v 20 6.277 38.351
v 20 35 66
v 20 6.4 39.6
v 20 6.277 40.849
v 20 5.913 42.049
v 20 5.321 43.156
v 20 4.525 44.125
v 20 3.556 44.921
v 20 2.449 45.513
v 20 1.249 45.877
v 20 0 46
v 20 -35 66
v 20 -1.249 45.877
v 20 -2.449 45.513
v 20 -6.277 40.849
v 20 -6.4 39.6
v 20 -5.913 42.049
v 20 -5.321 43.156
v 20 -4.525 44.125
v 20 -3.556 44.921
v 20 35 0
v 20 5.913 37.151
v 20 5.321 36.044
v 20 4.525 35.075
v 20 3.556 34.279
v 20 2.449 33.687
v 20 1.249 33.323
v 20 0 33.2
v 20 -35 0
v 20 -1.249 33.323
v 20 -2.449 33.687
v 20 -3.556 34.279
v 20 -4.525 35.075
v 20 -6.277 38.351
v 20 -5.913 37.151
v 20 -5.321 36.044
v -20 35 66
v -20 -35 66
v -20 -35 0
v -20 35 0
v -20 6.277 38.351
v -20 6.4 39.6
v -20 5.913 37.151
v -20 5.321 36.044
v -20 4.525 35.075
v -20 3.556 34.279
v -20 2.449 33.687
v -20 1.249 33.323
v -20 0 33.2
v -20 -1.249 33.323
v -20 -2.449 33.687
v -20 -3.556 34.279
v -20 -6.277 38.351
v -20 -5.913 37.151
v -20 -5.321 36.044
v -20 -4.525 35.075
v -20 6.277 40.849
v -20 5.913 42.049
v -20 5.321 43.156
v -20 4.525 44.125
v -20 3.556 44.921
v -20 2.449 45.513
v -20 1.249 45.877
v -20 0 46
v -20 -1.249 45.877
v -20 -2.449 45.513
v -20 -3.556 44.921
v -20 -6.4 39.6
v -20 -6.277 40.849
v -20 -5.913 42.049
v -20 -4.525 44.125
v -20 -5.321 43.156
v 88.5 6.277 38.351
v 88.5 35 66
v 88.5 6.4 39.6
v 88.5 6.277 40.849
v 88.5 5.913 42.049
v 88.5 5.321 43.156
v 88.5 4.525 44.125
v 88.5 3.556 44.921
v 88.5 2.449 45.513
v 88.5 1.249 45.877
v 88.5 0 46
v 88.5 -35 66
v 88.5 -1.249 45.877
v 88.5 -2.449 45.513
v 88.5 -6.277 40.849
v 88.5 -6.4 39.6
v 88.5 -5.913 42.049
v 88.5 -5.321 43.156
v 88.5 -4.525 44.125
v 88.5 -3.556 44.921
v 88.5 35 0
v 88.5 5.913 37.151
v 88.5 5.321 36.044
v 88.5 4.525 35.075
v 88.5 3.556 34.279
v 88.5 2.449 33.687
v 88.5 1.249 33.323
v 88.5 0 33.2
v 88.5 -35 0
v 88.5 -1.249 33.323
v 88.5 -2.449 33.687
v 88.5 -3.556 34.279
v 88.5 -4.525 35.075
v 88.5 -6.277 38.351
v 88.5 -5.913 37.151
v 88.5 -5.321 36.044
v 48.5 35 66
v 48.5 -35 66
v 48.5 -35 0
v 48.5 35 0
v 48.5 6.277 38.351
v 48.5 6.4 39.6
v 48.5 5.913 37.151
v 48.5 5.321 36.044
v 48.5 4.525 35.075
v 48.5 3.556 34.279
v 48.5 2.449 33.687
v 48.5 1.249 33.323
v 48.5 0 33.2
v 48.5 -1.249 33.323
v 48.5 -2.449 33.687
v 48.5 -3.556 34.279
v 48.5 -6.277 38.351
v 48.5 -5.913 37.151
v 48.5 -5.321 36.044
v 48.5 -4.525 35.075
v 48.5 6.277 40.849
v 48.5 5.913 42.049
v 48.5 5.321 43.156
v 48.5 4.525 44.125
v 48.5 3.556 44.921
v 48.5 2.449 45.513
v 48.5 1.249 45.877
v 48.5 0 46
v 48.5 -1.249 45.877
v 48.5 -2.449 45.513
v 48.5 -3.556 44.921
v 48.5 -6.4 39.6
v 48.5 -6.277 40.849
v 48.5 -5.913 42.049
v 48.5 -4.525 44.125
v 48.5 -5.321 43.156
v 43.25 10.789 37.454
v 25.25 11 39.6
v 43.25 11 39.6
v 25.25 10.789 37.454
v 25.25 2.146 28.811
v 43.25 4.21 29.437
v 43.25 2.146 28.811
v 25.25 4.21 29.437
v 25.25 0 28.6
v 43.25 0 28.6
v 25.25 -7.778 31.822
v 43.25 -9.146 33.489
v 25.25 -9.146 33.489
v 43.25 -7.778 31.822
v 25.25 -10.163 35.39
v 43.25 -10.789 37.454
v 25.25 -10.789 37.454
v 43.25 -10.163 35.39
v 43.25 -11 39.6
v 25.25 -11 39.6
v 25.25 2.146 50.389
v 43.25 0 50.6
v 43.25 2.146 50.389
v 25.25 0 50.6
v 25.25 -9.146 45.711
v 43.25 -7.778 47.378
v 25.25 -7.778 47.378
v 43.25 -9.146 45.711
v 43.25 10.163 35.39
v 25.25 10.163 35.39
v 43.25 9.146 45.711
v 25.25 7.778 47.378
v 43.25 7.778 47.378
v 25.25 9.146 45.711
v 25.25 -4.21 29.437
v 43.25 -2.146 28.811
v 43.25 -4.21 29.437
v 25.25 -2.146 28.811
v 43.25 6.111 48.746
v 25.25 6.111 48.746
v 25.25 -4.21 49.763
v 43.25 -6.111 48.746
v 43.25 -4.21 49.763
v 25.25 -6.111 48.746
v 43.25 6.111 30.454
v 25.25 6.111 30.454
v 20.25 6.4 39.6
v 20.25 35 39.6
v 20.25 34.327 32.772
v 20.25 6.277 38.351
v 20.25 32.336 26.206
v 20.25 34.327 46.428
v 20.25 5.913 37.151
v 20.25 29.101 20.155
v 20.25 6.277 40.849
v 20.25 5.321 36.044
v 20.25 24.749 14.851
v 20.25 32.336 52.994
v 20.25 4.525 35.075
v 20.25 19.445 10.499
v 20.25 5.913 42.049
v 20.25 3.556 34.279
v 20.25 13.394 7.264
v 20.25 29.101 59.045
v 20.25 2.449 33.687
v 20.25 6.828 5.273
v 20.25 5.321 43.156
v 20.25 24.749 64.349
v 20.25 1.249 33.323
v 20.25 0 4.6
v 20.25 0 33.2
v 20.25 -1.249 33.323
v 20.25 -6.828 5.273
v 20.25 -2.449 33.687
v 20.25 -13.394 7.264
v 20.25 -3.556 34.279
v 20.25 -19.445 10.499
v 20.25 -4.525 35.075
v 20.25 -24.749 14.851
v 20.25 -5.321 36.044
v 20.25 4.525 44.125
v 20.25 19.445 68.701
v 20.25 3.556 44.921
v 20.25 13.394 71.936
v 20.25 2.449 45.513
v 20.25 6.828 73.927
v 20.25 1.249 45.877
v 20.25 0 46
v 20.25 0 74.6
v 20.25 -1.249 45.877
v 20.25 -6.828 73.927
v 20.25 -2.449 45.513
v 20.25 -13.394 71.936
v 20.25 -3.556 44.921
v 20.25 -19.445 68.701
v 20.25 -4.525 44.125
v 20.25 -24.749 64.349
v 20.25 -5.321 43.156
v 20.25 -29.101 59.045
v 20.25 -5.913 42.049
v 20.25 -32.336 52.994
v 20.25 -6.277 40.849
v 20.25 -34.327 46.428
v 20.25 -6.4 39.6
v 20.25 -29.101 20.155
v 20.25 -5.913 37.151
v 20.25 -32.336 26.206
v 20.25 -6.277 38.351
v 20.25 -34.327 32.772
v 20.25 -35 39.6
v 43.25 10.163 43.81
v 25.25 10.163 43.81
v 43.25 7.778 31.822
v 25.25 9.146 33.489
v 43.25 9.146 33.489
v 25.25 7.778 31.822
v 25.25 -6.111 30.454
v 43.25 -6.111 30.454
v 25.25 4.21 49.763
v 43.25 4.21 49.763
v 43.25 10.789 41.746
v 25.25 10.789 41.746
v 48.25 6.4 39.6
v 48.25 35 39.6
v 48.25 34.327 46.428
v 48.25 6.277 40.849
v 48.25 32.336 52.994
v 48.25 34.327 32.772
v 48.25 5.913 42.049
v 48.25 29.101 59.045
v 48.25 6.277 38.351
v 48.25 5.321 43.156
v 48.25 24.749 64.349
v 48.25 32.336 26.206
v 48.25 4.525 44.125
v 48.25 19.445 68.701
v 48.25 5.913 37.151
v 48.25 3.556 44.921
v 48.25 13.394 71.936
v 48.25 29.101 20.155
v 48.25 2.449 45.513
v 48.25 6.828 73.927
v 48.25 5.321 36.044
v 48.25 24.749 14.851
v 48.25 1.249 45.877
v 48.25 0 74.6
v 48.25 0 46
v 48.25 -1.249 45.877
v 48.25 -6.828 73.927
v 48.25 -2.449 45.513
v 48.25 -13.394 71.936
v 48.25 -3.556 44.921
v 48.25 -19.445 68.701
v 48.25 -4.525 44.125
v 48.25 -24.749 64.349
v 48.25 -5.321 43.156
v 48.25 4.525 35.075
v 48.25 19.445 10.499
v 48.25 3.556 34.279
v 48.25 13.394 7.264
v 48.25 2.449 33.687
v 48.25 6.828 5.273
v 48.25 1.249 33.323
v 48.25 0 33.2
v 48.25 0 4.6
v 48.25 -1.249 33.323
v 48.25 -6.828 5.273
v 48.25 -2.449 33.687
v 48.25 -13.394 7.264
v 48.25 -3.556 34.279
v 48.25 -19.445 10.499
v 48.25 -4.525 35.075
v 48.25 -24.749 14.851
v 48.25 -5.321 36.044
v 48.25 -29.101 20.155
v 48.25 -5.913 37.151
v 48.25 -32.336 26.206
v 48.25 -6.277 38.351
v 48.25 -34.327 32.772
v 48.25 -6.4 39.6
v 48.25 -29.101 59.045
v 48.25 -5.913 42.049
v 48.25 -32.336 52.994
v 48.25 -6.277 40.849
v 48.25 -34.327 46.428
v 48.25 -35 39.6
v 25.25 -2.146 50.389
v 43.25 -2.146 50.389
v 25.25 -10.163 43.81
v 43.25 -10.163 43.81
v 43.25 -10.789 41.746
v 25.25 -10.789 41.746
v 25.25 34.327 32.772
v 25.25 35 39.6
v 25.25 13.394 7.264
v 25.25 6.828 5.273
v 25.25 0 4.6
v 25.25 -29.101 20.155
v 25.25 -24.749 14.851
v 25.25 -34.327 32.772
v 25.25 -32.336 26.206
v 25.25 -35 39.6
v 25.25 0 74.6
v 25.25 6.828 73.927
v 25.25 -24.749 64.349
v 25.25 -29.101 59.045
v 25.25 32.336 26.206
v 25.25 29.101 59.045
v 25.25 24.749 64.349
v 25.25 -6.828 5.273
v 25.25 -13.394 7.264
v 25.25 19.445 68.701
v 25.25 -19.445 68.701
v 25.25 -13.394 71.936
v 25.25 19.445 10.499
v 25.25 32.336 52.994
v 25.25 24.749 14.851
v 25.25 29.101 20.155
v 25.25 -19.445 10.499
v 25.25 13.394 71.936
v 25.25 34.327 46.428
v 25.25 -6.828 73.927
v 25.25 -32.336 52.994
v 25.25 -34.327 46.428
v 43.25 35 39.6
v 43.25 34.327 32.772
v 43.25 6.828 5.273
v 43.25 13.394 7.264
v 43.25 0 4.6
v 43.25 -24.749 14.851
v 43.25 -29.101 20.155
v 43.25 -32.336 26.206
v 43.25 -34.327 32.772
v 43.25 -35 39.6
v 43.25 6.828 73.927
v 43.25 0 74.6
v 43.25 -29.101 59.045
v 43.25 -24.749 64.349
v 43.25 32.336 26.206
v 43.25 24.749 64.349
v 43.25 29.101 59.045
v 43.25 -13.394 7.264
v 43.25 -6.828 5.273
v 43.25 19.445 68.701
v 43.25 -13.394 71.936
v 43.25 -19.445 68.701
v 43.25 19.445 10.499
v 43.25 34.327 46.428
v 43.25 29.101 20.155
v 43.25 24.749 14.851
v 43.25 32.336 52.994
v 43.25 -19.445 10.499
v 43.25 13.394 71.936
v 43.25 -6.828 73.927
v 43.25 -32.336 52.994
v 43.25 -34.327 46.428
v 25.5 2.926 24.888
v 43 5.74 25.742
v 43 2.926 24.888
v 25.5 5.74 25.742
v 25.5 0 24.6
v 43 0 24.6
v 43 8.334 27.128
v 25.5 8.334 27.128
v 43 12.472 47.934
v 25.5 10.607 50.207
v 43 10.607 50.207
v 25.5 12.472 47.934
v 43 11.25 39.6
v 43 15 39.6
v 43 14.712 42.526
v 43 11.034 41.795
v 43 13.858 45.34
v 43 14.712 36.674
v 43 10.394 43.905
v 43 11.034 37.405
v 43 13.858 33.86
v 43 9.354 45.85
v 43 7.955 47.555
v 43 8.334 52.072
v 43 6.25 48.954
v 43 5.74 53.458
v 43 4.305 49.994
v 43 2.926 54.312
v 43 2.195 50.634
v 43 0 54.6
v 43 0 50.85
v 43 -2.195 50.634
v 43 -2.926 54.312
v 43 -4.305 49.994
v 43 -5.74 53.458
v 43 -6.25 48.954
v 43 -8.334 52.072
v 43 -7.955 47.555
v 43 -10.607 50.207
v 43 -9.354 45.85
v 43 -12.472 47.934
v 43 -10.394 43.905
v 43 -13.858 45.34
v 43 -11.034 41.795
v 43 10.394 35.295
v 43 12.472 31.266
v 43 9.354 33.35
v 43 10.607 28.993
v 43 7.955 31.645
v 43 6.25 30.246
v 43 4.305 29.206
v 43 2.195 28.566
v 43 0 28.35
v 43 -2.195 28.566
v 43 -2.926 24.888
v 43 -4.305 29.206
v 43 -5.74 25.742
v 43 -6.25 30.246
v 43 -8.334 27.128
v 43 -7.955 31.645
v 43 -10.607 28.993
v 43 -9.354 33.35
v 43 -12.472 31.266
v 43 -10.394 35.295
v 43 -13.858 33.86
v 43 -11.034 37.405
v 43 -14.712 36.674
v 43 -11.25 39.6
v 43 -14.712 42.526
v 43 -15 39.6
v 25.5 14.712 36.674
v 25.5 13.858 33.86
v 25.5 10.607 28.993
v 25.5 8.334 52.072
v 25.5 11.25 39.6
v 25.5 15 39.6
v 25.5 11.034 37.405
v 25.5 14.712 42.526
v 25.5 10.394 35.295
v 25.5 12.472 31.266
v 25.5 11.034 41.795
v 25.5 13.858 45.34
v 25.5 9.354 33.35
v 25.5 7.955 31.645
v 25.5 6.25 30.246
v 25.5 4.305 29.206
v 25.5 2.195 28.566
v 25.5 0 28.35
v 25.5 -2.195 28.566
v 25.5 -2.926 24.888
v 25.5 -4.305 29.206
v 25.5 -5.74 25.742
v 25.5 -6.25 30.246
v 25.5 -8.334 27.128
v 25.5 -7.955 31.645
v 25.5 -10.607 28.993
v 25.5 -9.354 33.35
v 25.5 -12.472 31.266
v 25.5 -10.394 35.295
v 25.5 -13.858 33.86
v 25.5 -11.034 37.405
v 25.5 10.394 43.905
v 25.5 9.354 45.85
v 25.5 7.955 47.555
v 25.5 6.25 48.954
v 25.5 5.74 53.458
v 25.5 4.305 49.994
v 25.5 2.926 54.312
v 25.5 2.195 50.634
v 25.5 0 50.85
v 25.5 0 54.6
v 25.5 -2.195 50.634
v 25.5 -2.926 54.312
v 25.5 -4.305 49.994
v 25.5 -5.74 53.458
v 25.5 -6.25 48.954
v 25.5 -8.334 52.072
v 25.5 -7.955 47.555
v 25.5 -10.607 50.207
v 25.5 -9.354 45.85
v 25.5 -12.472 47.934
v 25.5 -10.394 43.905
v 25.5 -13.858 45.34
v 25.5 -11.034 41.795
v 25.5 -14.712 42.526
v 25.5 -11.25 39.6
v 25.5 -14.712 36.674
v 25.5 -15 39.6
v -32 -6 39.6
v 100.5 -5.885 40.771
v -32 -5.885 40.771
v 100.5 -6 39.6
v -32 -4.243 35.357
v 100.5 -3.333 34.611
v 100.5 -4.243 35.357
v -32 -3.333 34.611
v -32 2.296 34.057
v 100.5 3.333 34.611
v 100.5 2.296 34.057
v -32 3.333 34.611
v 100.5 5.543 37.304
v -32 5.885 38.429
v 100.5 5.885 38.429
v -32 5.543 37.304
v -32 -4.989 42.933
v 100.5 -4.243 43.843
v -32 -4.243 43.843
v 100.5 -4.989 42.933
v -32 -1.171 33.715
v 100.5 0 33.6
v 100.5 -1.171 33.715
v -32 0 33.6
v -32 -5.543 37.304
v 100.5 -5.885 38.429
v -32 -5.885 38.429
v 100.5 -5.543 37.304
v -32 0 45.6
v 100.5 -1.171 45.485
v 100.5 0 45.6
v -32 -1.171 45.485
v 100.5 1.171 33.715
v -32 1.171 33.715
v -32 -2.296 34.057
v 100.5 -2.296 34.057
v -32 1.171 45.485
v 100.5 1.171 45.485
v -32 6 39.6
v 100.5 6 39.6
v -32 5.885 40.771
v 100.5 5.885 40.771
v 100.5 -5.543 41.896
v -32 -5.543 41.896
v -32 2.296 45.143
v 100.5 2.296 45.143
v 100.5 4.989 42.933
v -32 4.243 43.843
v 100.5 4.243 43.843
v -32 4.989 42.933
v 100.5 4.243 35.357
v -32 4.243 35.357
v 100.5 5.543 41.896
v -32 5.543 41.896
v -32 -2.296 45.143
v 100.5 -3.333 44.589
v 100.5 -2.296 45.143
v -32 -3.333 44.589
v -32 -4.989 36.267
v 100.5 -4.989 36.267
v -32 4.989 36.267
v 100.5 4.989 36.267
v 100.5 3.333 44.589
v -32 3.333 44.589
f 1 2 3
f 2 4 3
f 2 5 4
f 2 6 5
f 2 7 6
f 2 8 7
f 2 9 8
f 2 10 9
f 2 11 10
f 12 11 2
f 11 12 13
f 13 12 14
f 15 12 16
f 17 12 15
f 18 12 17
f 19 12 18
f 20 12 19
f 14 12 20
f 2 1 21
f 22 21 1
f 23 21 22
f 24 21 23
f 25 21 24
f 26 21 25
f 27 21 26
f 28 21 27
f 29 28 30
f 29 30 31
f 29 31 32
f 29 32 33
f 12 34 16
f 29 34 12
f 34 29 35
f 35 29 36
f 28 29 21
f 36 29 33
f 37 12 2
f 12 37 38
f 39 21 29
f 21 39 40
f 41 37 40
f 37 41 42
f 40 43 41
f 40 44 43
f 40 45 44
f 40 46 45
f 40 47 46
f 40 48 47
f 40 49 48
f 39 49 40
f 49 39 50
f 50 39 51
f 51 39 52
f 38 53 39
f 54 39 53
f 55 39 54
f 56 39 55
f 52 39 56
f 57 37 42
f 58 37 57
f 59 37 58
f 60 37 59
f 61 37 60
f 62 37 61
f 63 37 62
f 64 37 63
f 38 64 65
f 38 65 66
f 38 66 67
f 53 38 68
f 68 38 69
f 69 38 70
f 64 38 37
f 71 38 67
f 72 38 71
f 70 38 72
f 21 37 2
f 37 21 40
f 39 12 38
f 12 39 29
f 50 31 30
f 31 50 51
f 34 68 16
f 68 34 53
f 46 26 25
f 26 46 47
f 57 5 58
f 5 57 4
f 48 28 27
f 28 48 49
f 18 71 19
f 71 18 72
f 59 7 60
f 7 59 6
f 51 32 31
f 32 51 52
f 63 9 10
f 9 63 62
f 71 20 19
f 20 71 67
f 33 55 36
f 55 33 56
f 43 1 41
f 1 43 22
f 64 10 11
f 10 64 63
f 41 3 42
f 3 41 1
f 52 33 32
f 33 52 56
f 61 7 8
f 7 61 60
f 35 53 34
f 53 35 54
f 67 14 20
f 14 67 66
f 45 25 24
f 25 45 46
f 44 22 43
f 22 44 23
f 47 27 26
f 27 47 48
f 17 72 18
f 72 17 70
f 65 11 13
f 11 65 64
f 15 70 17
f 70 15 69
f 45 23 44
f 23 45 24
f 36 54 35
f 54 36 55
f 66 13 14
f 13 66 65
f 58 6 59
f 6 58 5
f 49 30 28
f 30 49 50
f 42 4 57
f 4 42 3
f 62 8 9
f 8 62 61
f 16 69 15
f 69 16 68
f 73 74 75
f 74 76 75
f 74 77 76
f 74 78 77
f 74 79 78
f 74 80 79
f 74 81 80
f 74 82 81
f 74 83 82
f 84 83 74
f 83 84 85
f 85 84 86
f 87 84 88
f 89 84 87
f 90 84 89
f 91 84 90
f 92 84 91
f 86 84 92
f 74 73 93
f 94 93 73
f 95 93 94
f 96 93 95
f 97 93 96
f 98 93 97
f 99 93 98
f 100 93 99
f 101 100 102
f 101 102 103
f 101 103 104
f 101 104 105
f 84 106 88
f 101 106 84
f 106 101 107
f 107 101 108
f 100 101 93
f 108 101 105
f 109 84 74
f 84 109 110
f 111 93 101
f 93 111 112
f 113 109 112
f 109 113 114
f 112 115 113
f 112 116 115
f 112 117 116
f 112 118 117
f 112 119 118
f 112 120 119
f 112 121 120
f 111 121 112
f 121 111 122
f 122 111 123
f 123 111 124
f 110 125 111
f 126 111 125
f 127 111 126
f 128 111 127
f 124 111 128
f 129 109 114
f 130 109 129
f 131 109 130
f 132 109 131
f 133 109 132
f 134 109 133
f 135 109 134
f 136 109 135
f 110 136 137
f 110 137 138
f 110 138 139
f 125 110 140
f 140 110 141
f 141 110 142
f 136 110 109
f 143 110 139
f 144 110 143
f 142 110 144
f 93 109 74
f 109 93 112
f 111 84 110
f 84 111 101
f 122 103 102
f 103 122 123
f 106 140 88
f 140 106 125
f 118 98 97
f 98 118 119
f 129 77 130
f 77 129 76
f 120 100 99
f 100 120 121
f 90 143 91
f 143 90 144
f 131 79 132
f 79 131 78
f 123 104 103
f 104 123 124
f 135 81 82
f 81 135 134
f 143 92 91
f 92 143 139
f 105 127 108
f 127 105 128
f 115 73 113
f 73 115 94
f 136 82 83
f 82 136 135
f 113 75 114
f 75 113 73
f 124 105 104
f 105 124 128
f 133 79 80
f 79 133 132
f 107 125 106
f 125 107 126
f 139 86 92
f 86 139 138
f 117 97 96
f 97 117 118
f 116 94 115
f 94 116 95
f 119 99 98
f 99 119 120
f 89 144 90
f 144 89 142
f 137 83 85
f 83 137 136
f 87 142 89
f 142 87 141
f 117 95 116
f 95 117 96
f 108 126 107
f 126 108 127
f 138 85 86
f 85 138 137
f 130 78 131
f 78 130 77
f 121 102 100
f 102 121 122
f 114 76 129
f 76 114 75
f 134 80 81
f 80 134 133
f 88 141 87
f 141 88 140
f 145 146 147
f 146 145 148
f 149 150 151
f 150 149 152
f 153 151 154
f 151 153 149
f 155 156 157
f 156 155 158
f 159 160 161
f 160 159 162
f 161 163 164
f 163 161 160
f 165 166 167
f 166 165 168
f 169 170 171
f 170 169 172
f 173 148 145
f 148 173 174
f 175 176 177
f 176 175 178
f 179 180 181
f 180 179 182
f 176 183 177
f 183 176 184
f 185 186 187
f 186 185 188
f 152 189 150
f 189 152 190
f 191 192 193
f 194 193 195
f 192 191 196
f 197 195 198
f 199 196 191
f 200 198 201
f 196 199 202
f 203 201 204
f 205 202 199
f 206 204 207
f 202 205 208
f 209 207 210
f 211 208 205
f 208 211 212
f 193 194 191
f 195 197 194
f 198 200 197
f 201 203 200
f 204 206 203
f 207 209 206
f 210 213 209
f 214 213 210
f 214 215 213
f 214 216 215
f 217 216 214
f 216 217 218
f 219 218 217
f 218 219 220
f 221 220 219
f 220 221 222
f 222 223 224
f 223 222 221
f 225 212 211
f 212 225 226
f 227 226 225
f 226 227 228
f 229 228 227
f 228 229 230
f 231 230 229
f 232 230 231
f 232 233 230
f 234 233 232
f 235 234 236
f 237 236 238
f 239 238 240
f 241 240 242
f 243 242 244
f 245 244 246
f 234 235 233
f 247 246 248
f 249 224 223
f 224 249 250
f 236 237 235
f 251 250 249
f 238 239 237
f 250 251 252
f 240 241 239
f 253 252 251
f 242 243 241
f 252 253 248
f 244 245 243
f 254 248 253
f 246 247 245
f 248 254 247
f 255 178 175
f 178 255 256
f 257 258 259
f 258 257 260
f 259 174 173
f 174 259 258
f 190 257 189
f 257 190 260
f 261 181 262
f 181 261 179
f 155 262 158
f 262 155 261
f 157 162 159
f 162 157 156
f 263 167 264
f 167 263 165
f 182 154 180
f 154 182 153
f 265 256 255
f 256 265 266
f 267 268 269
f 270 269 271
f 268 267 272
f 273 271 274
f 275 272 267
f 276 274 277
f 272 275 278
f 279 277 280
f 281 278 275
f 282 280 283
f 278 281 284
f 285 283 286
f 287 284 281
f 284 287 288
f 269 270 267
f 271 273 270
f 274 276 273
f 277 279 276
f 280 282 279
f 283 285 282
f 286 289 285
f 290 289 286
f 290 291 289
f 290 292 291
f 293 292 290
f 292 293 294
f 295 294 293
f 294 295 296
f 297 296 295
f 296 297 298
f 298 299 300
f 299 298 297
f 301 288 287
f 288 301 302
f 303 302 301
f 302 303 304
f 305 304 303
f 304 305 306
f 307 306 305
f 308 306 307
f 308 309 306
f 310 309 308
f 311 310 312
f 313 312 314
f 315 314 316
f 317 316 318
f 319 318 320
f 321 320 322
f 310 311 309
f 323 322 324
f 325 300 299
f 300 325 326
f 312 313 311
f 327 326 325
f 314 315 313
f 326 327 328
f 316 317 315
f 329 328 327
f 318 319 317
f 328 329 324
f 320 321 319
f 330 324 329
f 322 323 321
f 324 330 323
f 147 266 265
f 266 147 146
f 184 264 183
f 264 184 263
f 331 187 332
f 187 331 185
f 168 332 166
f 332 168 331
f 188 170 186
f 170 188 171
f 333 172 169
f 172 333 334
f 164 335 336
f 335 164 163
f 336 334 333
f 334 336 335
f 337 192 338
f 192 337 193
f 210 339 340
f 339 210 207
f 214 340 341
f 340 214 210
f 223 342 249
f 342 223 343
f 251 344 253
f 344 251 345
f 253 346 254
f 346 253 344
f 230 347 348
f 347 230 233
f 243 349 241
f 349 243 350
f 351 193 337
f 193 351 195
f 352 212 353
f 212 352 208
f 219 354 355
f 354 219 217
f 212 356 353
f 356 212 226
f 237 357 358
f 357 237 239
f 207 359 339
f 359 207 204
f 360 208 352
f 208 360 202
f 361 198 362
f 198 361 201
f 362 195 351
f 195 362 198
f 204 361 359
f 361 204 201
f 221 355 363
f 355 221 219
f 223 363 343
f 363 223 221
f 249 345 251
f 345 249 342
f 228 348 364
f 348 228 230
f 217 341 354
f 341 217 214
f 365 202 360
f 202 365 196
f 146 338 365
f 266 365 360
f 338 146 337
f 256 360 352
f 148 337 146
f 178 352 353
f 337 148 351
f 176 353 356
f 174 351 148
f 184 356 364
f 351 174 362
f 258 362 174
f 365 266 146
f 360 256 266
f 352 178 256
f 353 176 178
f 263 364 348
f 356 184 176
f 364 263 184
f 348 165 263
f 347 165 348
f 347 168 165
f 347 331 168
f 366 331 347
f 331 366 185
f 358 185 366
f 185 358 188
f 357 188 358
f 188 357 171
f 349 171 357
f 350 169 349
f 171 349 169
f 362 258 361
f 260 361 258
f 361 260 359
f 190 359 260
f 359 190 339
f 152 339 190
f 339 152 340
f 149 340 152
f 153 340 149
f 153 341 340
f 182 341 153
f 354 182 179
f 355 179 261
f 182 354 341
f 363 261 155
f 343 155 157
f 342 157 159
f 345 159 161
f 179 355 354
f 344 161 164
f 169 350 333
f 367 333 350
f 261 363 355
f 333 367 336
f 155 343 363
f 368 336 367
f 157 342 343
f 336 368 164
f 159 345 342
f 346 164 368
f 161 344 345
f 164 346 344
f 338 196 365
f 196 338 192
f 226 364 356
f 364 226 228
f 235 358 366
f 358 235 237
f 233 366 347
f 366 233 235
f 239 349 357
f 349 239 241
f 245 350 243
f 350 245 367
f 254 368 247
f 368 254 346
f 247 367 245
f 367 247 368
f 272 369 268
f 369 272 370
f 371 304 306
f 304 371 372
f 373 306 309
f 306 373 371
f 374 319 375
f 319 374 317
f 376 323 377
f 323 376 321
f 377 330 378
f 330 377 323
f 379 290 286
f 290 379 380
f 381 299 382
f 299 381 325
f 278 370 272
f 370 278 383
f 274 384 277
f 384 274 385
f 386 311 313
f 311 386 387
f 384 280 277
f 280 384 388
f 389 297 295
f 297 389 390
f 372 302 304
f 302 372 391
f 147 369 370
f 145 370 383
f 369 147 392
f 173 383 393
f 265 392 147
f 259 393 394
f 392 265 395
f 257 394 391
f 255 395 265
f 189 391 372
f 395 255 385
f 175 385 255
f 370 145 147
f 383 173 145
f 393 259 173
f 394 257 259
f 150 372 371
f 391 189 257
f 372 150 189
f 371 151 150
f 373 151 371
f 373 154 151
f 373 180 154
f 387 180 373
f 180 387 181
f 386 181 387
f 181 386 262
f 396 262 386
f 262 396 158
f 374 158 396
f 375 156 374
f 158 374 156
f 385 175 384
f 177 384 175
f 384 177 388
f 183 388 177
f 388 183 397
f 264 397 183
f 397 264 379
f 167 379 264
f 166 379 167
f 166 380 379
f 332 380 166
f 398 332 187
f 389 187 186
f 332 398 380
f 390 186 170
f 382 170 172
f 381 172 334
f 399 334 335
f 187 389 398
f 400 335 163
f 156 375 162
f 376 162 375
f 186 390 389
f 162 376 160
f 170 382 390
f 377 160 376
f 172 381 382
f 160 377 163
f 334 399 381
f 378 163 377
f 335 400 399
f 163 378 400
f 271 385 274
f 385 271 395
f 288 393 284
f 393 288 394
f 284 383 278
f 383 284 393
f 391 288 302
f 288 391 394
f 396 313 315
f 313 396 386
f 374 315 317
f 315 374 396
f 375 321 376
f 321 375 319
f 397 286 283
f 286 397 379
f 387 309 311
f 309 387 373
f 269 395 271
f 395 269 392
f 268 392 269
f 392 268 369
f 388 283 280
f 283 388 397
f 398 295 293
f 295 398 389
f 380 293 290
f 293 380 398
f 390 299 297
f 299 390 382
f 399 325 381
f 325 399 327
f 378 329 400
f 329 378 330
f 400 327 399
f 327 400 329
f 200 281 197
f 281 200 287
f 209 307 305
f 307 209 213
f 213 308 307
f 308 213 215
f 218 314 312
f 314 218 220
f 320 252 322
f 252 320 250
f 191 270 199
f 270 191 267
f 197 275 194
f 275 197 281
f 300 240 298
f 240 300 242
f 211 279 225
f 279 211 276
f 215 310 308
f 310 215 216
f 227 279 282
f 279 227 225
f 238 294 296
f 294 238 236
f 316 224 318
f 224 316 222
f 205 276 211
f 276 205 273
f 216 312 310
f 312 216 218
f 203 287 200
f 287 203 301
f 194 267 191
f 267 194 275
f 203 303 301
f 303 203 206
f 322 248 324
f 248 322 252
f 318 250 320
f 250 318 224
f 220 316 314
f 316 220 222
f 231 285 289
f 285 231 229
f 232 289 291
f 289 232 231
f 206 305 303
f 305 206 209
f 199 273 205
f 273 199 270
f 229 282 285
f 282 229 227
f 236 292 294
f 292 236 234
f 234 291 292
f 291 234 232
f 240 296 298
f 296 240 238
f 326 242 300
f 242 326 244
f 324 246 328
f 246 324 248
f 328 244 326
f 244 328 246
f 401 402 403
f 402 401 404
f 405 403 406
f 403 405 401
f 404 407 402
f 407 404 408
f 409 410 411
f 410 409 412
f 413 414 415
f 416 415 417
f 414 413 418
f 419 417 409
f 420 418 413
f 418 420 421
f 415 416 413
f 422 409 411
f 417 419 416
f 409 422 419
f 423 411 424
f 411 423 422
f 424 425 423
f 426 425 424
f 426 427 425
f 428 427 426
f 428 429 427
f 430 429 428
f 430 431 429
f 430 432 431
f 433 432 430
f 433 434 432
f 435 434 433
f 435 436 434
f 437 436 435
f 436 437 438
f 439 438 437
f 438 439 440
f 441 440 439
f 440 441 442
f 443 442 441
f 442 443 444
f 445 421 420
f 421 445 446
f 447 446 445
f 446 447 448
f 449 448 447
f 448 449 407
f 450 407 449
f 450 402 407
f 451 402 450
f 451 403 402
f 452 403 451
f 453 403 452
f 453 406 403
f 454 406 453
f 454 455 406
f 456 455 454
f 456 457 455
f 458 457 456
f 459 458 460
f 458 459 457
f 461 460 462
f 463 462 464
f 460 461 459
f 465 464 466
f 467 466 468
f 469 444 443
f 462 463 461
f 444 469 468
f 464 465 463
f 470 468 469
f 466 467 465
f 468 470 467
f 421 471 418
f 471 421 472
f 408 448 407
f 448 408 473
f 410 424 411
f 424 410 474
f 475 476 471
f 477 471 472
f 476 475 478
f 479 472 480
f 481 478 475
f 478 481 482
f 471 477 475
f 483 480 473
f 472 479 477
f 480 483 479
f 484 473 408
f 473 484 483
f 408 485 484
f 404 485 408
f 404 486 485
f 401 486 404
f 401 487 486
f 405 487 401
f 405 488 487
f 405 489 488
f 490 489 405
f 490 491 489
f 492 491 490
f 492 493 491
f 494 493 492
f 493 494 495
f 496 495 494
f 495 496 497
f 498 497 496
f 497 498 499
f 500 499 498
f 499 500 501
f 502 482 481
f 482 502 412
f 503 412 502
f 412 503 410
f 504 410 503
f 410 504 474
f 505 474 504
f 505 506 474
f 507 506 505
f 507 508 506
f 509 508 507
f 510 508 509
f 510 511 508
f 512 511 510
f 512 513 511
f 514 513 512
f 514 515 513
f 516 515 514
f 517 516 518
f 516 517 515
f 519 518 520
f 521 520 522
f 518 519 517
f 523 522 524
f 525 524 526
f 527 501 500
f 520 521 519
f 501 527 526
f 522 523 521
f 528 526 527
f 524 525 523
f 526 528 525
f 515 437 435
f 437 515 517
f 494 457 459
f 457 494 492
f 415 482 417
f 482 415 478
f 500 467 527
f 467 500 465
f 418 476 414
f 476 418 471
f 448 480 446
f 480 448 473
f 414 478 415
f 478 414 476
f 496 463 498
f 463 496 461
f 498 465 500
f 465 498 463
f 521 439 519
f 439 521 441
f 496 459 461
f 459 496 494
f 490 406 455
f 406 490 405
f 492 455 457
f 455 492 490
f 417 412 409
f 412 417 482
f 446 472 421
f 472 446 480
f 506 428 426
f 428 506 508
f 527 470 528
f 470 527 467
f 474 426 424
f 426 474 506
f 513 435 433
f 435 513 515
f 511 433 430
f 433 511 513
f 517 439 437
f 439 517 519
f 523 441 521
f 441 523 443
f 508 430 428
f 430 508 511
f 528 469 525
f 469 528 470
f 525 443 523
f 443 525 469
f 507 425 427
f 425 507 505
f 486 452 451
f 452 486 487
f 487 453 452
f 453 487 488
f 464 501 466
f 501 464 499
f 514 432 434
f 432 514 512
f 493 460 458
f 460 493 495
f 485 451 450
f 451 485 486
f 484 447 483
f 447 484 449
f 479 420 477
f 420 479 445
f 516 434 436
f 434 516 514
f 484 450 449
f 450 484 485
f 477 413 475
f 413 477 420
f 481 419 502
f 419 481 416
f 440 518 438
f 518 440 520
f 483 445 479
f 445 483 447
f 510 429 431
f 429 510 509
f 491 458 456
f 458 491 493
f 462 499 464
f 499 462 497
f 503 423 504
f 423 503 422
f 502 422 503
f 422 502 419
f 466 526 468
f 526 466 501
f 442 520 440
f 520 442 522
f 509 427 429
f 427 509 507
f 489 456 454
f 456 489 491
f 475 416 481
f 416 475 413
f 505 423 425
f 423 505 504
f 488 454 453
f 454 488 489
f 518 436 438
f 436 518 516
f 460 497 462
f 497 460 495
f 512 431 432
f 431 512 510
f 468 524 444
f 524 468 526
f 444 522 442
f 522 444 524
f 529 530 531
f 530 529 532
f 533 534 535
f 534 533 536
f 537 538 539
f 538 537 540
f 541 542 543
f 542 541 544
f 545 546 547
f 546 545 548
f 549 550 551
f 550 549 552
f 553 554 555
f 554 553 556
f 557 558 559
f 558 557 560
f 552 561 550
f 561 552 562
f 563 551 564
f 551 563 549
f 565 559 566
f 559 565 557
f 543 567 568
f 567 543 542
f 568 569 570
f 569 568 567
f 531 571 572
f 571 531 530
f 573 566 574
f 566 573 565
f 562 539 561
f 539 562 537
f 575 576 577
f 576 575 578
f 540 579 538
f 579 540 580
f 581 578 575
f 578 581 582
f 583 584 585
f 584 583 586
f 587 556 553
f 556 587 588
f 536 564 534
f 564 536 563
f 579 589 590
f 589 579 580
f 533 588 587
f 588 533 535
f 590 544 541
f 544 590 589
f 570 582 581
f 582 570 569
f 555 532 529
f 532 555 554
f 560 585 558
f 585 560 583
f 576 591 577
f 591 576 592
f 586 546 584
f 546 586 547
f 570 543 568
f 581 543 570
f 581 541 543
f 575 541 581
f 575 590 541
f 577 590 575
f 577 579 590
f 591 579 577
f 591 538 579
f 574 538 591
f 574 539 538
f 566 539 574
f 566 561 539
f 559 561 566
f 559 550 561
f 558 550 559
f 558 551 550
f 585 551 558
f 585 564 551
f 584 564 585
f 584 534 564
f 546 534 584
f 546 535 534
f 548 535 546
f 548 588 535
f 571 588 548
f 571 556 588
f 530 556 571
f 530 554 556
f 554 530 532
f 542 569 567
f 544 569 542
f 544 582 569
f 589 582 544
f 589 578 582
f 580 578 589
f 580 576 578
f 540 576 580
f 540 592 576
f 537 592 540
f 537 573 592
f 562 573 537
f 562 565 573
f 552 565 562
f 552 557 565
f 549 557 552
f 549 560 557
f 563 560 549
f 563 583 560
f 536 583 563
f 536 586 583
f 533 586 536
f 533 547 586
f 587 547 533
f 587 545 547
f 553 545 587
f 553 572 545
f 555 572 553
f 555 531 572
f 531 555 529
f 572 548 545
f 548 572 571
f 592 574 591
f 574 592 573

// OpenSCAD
$fn = 32;

// ------------------------------------------------------------------------
// Pulley assembly: d70 pulley with a belt, shaft d12
// Every part is its own module, assembly() places them once.
// ------------------------------------------------------------------------

// --- part 1 ---
module support1() {
  difference() {
    translate([-20, -35, 0]) cube([40, 70, 66]);
    translate([0, 0, 39.6]) rotate([0, 90, 0]) cylinder(h = 42, d = 12.8, center = true);
  }
}

// --- part 2 ---
module support2() {
  difference() {
    translate([-20, -35, 0]) cube([40, 70, 66]);
    translate([0, 0, 39.6]) rotate([0, 90, 0]) cylinder(h = 42, d = 12.8, center = true);
  }
}

// --- part 3 ---
module shaft() {
  translate([0, 0, -66.25]) cylinder(h = 132.5, d = 12);
}

// --- part 4 ---
module pulley() {
  difference() {
    union() {
      cylinder(h = 28, d = 22);
      cylinder(h = 5, d = 70);
      translate([0, 0, 23]) cylinder(h = 5, d = 70);
    }
    translate([0, 0, -1]) cylinder(h = 30, d = 12.8);
  }
}

// --- part 5 ---
module belt() {
  difference() {
      translate([0, 0, 0]) cylinder(h = 17.5, d = 30);
      translate([0, 0, -1]) cylinder(h = 19.5, d = 22.5);
    }
}

// --- assembly ---
module assembly() {
  translate([0, 0, 0]) rotate([0, 0, 0]) support1();
  translate([68.5, 0, 0]) rotate([0, 0, 0]) support2();
  translate([34.25, 0, 39.6]) rotate([0, 90, 0]) shaft();
  translate([20.25, 0, 39.6]) rotate([0, 90, 0]) pulley();
  translate([25.5, 0, 39.6]) rotate([0, 90, 0]) belt();
}

assembly();
